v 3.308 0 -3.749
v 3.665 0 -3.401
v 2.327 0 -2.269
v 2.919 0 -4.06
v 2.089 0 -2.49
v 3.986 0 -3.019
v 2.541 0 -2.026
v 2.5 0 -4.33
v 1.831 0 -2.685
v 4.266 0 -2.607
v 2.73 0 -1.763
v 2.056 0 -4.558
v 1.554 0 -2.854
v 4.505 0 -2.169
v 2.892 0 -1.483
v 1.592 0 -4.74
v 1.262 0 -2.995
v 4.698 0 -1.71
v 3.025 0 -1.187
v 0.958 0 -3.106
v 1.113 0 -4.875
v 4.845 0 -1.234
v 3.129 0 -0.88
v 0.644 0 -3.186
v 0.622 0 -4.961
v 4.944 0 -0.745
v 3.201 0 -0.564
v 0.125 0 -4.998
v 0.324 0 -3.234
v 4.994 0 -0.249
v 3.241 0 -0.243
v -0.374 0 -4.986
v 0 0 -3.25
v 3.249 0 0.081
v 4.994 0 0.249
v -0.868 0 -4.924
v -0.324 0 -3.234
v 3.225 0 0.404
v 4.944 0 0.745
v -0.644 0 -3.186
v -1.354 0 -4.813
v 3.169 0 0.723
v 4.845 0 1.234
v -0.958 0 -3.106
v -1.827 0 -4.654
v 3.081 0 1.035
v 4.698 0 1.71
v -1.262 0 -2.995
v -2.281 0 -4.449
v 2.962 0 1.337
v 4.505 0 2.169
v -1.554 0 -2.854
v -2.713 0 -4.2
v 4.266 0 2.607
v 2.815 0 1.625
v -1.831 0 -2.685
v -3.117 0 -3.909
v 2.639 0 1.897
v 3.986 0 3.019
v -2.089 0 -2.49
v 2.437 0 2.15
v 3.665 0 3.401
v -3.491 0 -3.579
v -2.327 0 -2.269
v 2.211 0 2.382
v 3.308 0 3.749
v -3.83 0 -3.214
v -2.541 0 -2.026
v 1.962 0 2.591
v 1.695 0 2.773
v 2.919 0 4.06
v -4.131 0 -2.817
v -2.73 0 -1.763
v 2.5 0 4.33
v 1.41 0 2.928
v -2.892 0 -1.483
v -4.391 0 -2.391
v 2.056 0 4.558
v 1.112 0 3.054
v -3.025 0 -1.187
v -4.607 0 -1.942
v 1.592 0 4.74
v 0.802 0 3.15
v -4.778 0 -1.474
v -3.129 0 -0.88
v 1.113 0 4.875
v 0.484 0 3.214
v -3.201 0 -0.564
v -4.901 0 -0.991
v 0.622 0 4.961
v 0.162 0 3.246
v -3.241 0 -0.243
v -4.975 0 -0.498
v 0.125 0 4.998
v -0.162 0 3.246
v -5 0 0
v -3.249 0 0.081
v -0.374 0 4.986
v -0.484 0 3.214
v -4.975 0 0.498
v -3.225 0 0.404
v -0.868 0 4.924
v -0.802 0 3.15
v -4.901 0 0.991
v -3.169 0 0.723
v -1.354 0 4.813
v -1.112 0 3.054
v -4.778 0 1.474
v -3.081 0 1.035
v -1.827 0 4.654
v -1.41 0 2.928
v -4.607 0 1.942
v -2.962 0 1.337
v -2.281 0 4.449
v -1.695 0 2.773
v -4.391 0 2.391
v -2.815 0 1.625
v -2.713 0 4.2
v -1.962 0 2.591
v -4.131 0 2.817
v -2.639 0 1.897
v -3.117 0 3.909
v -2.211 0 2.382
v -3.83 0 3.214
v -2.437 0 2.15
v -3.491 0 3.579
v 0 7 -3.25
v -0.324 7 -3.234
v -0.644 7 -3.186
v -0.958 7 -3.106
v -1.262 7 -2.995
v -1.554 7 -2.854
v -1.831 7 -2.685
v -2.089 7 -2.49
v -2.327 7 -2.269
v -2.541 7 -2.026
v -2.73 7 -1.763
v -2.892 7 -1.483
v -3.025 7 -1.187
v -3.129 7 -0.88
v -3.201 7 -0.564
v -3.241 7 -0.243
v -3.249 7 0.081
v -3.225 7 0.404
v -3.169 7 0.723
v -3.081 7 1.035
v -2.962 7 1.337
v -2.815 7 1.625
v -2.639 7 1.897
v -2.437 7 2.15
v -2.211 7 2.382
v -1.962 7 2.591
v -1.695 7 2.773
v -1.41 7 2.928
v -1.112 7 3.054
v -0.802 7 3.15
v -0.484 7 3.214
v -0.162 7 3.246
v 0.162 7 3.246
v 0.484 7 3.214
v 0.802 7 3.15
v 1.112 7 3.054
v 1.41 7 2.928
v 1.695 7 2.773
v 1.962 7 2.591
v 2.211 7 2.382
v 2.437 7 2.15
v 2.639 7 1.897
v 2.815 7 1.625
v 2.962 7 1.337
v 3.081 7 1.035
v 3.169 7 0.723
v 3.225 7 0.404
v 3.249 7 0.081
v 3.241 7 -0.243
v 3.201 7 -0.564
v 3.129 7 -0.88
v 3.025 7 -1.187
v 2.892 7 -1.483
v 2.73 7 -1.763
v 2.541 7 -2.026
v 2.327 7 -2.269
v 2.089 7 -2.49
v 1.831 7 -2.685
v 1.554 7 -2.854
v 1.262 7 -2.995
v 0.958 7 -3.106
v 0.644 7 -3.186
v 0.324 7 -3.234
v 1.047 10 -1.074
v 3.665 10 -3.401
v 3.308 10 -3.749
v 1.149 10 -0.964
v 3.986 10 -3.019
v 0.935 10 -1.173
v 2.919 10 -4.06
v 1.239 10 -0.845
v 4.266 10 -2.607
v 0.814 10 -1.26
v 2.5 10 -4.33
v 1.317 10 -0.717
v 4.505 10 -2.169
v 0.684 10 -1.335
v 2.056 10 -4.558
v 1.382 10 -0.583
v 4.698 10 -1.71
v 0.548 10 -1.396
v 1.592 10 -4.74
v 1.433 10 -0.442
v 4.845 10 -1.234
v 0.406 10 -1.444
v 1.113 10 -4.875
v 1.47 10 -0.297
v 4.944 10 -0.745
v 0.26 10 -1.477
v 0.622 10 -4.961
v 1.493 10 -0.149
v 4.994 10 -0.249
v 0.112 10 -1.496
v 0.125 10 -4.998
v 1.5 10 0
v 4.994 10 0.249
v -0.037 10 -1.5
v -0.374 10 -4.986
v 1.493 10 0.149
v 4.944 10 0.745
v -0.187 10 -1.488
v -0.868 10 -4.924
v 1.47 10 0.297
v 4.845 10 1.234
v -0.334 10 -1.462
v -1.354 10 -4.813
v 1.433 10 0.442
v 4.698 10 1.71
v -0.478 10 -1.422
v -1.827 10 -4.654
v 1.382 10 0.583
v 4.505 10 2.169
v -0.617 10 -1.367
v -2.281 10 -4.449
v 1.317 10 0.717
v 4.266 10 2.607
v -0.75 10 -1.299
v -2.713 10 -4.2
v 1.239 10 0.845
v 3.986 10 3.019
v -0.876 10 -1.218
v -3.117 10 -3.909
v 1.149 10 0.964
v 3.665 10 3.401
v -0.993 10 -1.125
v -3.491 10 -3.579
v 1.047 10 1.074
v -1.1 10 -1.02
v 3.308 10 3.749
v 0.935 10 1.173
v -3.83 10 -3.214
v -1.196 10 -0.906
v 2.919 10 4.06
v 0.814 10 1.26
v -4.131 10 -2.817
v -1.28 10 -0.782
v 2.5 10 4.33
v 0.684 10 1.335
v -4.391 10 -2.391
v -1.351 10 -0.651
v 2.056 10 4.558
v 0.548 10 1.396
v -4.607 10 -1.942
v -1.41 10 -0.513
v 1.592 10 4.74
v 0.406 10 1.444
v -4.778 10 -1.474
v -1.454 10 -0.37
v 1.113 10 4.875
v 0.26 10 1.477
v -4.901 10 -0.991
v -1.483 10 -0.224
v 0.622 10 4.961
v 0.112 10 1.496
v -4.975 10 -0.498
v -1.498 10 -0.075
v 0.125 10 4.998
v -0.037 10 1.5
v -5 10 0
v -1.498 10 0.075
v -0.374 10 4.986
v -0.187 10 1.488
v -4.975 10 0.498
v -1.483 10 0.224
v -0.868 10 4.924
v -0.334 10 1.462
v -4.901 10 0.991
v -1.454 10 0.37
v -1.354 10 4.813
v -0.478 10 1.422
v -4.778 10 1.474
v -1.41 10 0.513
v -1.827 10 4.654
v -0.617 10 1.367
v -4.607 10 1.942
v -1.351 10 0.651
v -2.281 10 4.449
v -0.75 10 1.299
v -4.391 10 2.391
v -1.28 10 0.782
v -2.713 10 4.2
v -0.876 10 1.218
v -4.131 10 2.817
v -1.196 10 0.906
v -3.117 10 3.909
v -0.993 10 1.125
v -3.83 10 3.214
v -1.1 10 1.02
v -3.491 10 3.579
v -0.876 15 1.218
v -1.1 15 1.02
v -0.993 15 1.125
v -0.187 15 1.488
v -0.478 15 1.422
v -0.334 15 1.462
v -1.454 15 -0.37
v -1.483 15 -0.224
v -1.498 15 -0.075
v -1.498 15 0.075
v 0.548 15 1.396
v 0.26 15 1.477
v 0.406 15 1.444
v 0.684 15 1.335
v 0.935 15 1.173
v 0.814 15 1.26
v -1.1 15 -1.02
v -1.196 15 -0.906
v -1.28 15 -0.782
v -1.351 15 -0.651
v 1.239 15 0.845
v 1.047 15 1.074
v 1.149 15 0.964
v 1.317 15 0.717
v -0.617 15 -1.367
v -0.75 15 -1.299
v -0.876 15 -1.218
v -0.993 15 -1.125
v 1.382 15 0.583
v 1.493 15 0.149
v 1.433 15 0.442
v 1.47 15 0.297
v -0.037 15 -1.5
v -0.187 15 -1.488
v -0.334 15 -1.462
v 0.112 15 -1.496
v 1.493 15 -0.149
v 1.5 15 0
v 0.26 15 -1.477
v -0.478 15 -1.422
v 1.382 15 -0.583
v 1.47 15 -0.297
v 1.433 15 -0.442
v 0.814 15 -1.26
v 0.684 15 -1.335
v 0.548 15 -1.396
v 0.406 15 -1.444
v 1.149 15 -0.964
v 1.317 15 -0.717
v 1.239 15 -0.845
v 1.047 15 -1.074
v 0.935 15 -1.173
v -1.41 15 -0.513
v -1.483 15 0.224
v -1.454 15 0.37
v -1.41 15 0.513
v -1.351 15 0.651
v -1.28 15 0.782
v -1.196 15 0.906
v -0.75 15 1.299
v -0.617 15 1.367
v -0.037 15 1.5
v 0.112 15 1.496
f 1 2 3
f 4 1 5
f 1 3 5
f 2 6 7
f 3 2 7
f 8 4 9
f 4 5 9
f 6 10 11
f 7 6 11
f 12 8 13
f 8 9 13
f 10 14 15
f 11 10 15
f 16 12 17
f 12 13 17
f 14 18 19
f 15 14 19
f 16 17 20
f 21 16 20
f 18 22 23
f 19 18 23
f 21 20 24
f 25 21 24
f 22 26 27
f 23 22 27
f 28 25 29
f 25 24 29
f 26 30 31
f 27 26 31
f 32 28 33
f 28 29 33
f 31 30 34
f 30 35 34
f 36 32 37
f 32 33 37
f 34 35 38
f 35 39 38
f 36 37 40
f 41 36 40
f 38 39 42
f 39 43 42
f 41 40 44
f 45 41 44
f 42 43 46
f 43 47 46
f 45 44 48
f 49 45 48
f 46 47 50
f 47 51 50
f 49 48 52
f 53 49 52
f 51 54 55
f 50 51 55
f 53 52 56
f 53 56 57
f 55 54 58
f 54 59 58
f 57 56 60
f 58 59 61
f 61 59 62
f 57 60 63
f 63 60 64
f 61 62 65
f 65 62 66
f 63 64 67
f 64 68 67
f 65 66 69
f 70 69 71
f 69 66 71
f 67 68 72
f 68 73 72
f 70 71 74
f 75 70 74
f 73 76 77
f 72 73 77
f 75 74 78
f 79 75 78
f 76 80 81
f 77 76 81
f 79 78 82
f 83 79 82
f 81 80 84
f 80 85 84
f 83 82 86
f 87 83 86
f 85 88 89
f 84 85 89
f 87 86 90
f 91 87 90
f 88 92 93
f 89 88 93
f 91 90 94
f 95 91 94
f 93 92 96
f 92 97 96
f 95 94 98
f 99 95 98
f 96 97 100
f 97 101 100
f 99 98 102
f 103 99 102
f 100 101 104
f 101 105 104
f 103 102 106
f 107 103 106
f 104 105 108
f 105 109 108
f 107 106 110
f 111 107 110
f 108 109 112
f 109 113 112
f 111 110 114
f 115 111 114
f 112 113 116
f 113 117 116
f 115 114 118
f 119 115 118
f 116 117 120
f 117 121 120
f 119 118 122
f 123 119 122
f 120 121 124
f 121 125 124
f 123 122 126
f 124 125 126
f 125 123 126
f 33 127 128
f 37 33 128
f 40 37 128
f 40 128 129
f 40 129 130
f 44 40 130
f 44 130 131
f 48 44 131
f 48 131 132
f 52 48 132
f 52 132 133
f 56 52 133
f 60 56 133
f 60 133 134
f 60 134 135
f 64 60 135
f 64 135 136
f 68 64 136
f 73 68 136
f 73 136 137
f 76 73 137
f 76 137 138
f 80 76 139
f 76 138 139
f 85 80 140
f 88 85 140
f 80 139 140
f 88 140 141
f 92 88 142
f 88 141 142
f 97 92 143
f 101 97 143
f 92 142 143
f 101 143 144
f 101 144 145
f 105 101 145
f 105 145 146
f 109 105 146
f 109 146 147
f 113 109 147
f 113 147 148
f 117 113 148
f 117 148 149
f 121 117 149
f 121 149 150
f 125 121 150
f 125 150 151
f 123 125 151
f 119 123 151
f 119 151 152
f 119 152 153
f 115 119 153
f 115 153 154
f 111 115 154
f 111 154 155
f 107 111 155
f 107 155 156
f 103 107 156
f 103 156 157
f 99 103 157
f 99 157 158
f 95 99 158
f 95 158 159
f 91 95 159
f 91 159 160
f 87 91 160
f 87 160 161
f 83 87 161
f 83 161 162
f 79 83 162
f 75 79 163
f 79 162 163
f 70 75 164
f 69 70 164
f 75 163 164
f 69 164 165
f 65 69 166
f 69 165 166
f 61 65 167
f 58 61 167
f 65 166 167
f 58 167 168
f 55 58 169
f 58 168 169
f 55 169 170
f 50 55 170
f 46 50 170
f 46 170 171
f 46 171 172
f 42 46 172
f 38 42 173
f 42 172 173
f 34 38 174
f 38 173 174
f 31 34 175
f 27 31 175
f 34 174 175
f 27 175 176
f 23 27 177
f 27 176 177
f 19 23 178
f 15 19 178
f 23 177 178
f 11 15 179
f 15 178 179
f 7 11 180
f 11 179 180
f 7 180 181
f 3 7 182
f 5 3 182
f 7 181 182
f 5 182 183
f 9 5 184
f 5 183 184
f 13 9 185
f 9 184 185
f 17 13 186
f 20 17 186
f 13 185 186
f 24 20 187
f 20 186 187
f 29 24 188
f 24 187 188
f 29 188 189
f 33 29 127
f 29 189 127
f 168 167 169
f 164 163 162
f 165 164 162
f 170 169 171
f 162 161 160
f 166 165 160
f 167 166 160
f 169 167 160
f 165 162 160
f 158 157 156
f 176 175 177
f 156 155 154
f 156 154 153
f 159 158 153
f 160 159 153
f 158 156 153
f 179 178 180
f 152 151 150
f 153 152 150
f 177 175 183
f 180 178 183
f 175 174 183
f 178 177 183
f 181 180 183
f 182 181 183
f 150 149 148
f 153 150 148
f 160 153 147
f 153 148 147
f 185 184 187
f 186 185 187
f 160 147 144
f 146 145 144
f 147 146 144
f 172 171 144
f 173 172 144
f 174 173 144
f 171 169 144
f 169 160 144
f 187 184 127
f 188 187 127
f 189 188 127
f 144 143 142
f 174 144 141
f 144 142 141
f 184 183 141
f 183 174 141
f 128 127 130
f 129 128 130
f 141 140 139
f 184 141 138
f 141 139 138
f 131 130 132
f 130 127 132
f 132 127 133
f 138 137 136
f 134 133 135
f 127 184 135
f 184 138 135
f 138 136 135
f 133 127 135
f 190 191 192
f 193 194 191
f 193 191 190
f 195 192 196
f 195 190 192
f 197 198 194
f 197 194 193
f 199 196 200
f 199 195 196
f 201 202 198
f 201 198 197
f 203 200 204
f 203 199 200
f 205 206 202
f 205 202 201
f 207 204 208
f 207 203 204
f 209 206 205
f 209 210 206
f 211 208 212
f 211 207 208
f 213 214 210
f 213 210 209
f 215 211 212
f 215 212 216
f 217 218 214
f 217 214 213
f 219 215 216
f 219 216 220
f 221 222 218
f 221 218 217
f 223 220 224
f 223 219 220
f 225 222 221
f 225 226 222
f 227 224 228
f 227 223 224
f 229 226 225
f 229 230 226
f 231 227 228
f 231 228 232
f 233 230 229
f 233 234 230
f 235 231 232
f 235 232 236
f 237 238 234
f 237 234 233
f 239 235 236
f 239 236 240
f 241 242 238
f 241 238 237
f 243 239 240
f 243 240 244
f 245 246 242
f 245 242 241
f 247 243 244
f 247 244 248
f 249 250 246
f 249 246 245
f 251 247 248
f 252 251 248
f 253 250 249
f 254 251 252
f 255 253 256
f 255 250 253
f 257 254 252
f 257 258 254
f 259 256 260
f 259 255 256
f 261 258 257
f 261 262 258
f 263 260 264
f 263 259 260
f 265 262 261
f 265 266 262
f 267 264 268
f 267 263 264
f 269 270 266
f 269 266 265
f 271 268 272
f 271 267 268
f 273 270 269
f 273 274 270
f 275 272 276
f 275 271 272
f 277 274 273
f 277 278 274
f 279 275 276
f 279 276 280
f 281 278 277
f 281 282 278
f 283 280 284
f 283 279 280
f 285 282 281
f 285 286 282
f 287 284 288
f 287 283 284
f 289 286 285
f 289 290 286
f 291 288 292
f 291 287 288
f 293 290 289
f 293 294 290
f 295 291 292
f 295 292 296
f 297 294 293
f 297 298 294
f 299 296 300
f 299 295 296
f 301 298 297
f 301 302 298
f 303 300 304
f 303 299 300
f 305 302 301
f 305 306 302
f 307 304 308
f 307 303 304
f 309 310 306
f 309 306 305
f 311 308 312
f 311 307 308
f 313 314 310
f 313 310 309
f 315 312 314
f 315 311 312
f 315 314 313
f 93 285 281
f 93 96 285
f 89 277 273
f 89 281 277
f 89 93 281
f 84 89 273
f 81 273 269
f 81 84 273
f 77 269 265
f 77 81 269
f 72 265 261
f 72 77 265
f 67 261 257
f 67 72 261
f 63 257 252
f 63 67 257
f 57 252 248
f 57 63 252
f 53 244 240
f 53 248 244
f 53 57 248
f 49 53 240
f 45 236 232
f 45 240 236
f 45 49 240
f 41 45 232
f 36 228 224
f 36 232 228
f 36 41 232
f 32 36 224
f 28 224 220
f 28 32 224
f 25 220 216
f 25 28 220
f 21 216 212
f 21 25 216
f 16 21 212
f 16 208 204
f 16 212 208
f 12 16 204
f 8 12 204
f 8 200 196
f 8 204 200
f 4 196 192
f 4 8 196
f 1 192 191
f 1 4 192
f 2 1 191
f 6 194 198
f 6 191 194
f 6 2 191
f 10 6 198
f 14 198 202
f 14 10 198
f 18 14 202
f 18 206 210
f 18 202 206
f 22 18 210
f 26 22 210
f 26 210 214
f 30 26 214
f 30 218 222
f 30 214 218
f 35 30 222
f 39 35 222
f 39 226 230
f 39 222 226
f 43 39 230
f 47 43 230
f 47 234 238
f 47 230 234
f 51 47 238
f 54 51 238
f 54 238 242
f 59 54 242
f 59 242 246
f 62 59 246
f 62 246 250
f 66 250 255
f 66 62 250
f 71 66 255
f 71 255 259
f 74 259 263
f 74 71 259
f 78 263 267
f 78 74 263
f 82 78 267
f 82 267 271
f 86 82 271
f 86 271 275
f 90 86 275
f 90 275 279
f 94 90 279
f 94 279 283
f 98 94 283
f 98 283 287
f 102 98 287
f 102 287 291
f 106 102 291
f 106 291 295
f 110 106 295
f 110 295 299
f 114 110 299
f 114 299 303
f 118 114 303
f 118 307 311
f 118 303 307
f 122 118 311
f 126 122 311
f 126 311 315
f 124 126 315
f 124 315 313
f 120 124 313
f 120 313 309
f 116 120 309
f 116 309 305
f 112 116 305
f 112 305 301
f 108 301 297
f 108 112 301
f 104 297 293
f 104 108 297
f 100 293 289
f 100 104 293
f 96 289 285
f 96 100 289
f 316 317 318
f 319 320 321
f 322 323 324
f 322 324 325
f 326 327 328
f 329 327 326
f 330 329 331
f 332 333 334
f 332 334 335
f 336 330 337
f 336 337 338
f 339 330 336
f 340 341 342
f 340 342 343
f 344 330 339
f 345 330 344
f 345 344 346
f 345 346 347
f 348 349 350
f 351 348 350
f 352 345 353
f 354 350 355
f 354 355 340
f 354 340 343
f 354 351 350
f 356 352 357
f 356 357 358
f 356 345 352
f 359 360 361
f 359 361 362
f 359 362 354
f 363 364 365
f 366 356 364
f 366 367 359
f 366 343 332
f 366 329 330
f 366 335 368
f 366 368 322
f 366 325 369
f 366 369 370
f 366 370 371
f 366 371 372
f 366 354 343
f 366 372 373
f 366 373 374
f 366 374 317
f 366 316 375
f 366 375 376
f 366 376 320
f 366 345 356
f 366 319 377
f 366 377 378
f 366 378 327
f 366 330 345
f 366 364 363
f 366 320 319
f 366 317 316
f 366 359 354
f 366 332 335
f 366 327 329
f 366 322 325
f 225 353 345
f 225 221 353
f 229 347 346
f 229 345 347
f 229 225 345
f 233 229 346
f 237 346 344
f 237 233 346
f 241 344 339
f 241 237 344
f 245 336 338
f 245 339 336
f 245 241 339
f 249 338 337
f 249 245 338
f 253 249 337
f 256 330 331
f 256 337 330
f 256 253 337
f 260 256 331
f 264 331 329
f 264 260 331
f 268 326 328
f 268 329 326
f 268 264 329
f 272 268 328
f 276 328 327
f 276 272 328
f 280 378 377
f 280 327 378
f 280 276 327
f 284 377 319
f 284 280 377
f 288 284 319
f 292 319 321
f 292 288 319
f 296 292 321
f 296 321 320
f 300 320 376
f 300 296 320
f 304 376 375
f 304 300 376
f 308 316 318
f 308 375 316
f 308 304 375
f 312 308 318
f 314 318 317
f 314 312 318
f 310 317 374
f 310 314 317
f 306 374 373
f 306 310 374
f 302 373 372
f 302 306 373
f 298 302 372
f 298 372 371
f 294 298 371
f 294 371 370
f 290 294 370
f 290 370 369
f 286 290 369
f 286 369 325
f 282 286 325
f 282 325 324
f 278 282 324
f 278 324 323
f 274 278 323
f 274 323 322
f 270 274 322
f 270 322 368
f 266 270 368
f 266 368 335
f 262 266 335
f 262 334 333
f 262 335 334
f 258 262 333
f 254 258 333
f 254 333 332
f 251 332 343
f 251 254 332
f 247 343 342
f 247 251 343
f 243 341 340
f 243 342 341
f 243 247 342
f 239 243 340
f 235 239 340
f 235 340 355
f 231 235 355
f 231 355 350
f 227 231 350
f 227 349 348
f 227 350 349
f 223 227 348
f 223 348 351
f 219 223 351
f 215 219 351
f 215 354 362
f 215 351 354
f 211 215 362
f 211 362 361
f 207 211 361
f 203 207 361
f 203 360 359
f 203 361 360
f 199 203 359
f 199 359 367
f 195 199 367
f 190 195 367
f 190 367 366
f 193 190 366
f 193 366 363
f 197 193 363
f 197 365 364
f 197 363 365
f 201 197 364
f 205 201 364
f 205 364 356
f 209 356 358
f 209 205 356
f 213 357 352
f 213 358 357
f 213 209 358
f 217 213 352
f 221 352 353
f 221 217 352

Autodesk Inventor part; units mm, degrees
ref_plane "YZ Plane" through (0, 0, 0) normal (1, 0, 0) x (0, 1, 0)
ref_plane "XZ Plane" through (0, 0, 0) normal (0, 1, 0) x (-1, 0, 0)
ref_plane "XY Plane" through (0, 0, 0) normal (0, 0, 1) x (1, 0, 0)
sketch "Sketch1" plane through (0, 0, 0) normal (0, 1, 0) x (-1, 0, 0)
  circle A0 centre (0, 0) radius 5
  dimension "d0" = 10
extrude "Extrusion1" add sketch "Sketch1" along normal blind 10
sketch "Sketch2" plane through (0, 10, 0) normal (0, 1, 0) x (1, 0, 0)
  circle A0 centre (0, 0) radius 1.5
  dimension "d3" = 3
extrude "Extrusion2" add sketch "Sketch2" along normal blind 5
sketch "Sketch3" plane through (0, 0, 0) normal (0, -1, 0) x (1, 0, 0)
  circle A0 centre (0, 0) radius 3
  dimension "d6" = 6
hole "Hole1" at (0, 0, 0) direction (0, 1, 0) diameter 6.5 depth 7
properties part number "acople2"
